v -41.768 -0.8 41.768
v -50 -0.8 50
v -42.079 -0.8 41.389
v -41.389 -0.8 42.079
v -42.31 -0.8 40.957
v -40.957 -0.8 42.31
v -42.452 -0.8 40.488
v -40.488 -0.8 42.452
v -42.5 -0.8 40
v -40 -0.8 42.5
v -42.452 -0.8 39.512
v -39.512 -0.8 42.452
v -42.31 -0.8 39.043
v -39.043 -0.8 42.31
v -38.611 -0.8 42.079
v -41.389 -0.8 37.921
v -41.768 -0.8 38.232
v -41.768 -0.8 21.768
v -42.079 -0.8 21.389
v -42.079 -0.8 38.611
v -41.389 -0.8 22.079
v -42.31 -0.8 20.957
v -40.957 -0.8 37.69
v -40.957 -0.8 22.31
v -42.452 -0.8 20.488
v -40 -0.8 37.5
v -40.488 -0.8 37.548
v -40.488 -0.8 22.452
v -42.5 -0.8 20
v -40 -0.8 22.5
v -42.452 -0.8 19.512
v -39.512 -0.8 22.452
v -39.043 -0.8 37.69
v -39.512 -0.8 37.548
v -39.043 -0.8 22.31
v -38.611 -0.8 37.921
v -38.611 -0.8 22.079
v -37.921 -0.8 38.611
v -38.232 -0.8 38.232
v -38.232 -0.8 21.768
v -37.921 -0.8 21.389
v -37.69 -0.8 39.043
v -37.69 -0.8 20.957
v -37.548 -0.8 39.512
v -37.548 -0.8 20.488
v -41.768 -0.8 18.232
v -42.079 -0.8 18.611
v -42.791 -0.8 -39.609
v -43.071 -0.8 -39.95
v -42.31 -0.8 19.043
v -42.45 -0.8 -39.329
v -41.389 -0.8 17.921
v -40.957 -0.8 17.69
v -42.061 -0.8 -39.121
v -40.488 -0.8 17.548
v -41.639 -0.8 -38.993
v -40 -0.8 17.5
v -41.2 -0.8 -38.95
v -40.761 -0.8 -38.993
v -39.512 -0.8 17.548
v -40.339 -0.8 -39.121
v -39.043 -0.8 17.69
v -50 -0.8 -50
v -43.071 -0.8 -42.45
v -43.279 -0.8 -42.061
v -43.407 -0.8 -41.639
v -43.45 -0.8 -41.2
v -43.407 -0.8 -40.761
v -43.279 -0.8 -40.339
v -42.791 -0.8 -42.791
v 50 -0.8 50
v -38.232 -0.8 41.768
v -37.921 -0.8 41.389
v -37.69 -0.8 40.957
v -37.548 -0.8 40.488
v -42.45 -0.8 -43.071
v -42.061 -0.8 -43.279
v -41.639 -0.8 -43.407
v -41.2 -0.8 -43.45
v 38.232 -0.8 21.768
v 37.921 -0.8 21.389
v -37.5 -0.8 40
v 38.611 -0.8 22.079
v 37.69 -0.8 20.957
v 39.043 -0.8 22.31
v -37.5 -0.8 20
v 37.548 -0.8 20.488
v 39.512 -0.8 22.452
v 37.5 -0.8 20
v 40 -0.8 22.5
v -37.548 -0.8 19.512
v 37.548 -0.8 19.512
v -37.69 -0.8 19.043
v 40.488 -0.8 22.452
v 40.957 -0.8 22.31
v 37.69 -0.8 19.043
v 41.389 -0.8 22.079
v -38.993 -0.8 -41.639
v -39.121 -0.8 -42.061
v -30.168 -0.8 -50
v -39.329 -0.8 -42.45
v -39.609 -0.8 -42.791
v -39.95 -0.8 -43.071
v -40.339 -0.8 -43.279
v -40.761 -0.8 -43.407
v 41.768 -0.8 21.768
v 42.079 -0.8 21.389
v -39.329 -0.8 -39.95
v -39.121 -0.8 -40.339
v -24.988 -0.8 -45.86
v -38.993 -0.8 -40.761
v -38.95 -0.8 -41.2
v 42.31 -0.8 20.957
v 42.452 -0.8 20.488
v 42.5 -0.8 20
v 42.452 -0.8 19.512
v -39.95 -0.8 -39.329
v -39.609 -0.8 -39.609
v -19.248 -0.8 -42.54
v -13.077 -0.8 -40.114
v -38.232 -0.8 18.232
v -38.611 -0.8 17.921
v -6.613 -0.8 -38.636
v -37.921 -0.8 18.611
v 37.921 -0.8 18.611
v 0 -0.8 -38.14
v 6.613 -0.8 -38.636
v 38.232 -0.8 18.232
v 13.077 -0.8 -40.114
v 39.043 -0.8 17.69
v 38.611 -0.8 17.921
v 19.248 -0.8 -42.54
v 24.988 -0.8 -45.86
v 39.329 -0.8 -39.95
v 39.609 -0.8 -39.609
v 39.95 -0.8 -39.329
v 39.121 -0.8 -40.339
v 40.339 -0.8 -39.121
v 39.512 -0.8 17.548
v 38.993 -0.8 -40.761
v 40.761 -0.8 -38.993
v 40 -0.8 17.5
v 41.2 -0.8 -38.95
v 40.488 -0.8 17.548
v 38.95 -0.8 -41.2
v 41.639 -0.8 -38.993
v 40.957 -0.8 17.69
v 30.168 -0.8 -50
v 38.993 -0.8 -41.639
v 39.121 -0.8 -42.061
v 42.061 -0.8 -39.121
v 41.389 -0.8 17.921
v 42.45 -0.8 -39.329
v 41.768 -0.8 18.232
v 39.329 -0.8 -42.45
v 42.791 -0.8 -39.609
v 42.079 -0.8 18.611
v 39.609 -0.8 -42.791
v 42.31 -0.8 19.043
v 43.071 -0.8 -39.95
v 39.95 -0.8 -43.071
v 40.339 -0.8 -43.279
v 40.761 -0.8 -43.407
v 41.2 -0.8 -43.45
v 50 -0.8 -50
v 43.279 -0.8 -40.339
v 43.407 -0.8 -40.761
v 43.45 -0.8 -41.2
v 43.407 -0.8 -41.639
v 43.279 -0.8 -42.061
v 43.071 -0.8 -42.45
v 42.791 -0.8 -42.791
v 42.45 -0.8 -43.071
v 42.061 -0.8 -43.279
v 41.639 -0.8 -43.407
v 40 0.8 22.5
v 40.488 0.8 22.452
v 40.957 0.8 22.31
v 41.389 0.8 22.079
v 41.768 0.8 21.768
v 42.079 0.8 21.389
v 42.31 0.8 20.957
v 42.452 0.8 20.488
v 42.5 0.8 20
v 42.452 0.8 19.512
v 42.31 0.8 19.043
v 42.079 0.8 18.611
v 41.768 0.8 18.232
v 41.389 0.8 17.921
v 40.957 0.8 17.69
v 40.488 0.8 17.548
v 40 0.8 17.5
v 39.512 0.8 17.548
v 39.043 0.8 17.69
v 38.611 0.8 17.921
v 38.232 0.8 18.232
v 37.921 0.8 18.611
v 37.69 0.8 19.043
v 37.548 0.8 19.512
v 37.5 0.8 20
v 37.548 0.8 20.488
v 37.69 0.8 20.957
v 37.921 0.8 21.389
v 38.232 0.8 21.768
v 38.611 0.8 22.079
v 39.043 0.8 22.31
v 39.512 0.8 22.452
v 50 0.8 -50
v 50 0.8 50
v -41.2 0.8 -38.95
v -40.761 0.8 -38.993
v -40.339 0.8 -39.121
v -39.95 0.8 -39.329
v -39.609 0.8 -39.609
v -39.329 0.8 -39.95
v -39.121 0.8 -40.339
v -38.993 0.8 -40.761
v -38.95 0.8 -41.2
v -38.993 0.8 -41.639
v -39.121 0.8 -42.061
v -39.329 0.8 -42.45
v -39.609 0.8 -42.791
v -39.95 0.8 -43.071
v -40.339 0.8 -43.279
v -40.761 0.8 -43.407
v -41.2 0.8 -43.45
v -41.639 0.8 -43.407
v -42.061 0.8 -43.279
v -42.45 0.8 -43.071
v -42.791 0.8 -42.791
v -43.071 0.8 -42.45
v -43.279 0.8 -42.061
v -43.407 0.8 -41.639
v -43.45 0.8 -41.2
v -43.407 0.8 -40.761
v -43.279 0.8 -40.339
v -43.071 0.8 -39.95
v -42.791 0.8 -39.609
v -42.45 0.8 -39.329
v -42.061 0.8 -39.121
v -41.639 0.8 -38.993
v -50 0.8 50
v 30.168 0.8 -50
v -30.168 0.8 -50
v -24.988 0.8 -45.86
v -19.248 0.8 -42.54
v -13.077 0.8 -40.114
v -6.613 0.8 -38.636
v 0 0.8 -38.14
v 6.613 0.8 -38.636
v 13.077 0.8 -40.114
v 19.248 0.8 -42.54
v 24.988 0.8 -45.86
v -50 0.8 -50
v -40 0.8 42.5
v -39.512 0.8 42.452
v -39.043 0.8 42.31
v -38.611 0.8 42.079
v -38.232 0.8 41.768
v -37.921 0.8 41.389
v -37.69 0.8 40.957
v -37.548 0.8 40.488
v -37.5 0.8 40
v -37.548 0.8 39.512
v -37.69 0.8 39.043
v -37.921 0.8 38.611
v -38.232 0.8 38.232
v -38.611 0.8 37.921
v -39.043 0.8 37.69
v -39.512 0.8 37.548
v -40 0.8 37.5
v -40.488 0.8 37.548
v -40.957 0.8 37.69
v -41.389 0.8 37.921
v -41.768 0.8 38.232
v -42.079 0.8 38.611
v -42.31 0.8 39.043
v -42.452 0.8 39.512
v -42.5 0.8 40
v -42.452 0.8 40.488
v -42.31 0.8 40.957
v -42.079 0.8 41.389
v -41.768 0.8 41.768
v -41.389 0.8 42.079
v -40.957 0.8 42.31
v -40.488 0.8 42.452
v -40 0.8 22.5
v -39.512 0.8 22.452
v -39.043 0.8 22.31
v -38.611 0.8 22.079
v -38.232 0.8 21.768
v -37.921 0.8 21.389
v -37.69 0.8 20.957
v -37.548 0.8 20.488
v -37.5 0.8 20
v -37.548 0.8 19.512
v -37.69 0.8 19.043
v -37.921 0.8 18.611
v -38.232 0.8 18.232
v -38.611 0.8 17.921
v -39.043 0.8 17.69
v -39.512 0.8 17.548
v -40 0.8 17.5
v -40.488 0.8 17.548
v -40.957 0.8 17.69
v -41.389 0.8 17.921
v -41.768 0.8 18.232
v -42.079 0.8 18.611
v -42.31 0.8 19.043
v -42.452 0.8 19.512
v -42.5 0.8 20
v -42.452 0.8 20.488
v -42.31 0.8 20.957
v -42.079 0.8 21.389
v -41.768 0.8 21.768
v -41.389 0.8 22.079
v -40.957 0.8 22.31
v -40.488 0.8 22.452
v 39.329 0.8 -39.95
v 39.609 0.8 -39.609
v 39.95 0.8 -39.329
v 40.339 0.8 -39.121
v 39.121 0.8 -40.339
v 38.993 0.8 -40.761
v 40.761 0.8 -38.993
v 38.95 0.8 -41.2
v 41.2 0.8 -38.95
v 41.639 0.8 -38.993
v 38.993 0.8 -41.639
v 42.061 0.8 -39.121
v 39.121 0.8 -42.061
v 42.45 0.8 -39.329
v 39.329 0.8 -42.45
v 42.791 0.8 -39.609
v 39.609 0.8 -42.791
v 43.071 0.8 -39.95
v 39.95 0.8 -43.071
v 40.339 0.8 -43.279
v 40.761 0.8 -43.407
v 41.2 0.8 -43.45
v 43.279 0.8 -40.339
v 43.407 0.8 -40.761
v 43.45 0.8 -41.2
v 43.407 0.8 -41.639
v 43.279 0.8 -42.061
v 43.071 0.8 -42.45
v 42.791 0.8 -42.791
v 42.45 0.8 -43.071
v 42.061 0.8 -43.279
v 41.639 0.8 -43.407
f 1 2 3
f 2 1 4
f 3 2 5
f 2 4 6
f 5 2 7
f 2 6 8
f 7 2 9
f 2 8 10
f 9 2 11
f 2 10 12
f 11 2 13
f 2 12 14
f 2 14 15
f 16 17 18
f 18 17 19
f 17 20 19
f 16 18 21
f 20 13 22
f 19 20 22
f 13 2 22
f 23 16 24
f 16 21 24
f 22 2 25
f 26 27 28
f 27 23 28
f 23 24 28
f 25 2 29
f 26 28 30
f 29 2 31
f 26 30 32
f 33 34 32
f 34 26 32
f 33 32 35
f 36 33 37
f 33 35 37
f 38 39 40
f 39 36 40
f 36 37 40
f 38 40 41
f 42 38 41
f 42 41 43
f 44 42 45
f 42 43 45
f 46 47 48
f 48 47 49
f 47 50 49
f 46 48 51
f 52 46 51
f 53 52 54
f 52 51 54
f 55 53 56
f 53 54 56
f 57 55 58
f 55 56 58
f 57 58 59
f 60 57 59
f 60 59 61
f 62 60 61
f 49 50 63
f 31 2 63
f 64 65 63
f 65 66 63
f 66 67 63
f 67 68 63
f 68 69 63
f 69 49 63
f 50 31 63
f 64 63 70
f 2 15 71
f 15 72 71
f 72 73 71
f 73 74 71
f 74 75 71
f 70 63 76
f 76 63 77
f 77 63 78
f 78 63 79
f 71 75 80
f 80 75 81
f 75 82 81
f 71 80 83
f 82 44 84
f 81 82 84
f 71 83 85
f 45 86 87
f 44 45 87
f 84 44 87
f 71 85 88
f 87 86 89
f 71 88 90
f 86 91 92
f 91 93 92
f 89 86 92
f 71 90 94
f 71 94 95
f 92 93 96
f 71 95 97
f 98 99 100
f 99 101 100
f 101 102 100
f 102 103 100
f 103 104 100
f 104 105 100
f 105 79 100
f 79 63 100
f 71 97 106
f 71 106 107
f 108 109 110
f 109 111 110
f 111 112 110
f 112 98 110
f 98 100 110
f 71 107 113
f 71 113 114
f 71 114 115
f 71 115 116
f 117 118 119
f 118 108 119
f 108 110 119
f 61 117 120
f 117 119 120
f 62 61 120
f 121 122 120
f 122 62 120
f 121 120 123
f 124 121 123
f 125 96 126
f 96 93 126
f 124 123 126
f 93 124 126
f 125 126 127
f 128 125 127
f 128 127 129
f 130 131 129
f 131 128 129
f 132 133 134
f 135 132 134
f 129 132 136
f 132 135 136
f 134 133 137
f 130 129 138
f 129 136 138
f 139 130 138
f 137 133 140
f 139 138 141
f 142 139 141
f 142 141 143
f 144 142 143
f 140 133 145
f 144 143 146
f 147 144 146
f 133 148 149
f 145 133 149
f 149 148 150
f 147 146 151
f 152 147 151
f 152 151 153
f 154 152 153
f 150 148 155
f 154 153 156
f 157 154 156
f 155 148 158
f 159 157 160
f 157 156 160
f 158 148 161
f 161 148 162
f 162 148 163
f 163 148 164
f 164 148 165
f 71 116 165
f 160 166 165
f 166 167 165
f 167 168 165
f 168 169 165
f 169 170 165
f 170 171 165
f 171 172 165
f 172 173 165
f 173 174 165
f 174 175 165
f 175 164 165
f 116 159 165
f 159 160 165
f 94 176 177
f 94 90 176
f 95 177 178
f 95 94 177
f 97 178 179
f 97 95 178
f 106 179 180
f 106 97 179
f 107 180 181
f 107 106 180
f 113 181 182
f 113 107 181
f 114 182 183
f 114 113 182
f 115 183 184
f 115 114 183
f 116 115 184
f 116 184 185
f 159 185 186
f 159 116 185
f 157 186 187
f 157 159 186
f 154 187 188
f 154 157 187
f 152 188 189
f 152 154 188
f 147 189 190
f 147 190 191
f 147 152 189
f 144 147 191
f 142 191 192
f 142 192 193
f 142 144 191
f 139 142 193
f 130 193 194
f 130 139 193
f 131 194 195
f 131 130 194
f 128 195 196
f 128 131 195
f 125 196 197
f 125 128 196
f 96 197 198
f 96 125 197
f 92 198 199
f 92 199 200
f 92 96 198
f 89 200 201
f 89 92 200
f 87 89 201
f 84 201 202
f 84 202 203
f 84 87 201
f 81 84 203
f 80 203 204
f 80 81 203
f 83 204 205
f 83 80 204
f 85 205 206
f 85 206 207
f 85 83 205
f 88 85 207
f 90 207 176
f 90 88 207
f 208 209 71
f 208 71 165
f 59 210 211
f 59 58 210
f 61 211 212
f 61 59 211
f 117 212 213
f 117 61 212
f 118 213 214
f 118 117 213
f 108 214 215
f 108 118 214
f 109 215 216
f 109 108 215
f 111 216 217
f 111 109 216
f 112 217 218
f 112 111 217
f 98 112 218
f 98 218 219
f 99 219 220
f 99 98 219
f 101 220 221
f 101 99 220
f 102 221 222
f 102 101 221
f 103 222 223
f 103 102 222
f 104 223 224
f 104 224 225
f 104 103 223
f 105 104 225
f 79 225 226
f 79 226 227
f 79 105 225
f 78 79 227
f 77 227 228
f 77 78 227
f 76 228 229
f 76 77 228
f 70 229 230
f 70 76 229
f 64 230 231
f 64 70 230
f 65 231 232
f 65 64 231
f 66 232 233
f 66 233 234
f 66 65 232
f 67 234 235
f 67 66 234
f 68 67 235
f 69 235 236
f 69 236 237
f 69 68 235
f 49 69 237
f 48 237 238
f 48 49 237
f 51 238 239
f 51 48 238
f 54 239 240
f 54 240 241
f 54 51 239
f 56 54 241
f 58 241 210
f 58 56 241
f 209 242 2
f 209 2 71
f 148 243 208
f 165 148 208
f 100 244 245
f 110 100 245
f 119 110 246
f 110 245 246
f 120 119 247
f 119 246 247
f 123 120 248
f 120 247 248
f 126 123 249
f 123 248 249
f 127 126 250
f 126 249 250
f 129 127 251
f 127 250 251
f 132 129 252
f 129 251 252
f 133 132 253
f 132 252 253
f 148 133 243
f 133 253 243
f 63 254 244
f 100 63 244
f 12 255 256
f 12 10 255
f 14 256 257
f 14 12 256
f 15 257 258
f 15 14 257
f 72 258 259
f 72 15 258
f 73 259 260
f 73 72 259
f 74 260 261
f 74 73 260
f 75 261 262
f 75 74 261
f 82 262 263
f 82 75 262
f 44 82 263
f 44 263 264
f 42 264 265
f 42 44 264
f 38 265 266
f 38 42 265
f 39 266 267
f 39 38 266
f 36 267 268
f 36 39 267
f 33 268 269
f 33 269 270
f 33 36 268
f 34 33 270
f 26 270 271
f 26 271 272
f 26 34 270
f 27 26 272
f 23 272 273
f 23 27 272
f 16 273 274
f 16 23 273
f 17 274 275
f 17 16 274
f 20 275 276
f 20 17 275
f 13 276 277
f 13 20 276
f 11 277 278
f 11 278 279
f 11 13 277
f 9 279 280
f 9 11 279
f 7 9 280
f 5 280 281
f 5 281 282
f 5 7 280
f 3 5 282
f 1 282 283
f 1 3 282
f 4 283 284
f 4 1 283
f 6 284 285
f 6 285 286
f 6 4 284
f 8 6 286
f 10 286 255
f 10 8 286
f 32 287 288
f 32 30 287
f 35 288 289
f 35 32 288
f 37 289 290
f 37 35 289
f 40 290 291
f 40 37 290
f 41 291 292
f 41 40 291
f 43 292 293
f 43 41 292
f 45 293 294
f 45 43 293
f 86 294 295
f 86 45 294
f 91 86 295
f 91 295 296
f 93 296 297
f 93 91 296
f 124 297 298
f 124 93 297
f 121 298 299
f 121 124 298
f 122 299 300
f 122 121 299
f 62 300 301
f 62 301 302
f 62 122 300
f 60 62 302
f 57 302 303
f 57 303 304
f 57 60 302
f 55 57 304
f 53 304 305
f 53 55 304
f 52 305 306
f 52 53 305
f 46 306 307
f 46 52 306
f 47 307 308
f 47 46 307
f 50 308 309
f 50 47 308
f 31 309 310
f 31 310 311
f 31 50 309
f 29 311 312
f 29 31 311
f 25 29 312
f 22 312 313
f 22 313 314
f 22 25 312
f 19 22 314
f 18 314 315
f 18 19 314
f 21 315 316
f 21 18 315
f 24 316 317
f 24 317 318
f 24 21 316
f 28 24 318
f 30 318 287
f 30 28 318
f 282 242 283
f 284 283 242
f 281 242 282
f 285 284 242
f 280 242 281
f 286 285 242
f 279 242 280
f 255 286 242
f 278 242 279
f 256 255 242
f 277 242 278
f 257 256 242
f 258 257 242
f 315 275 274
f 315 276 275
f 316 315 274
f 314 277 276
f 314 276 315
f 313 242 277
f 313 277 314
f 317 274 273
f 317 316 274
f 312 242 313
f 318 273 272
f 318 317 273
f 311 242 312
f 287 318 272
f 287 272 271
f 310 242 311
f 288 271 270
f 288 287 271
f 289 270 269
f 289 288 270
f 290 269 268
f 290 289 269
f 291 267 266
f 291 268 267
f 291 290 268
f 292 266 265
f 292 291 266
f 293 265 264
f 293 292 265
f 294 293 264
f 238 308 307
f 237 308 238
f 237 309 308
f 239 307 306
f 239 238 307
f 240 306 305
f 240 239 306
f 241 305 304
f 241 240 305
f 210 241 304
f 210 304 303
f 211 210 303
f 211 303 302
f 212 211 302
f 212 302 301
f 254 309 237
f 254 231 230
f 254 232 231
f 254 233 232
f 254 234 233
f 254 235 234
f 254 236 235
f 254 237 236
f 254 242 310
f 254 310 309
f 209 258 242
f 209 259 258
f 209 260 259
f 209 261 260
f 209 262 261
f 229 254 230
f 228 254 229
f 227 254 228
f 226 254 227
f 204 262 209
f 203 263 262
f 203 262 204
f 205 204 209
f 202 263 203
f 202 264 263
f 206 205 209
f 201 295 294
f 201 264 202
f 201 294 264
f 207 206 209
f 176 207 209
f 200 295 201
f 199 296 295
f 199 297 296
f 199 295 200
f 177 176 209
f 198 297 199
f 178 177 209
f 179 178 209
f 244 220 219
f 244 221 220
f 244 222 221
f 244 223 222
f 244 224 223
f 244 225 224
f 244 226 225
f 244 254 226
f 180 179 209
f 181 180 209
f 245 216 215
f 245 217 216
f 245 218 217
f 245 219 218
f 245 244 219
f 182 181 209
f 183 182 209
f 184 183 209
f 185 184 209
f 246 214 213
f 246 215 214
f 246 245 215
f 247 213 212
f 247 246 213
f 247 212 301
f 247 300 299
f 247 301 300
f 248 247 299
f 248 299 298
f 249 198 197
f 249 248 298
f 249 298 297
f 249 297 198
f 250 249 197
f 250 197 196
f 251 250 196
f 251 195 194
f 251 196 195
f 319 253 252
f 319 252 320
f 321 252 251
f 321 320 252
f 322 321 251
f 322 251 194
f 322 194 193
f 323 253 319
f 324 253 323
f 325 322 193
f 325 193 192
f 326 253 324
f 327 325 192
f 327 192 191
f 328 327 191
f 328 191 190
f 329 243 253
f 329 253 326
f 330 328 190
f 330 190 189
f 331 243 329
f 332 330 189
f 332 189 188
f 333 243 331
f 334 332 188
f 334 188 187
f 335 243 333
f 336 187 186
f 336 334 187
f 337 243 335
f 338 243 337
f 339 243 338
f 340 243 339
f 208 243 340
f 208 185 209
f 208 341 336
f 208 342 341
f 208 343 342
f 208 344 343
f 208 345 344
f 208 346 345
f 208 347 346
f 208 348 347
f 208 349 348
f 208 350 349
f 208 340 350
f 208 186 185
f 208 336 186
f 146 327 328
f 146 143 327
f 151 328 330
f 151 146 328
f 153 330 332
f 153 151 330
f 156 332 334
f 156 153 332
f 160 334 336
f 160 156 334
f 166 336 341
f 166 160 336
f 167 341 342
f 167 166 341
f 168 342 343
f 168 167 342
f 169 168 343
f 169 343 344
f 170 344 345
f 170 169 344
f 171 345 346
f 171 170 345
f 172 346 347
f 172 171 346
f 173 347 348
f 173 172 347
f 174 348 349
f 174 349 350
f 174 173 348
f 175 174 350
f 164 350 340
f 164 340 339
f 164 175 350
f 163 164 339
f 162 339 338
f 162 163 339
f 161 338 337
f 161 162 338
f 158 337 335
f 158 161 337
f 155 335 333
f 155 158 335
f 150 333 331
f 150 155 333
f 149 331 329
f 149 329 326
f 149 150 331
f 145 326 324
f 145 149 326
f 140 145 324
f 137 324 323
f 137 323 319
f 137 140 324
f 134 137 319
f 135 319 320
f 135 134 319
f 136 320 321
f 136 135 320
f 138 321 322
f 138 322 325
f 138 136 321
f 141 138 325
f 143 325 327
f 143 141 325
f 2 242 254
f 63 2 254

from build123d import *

# Parameters (mm, degrees)
SKETCH1_W           = 100
SKETCH1_H           = 100
SKETCH1_R           = 2.5
SKETCH1_R_2         = 2.25
BOSS_EXTRUDE1_DEPTH = 0.8
SKETCH2_R           = 44.3
CUT_EXTRUDE1_DEPTH  = 71.728777736


with BuildPart() as part:
    # Sketch1 → Boss-Extrude1 (new, symmetric)
    with BuildSketch(Plane(origin=(0, 0, 0), x_dir=(1, 0, 0), z_dir=(0, 1, 0))):
        Rectangle(SKETCH1_W, SKETCH1_H)
        with Locations((-40, -40)):
            Circle(SKETCH1_R, mode=Mode.SUBTRACT)
        with Locations((-40, -20)):
            Circle(SKETCH1_R, mode=Mode.SUBTRACT)
        with Locations((40, -20)):
            Circle(SKETCH1_R, mode=Mode.SUBTRACT)
        with Locations((-41.2, 41.2)):
            Circle(SKETCH1_R_2, mode=Mode.SUBTRACT)
        with Locations((41.2, 41.2)):
            Circle(SKETCH1_R_2, mode=Mode.SUBTRACT)
    extrude(amount=BOSS_EXTRUDE1_DEPTH, both=True)

    # Sketch2 → Cut-Extrude1 (cut, through all)
    with BuildSketch(Plane(origin=(0, 0.8, 0), x_dir=(1, 0, 0), z_dir=(0, 1, 0))):
        with Locations((0, 82.44)):
            Circle(SKETCH2_R)
    extrude(amount=-CUT_EXTRUDE1_DEPTH, mode=Mode.SUBTRACT)


solid = part.part
